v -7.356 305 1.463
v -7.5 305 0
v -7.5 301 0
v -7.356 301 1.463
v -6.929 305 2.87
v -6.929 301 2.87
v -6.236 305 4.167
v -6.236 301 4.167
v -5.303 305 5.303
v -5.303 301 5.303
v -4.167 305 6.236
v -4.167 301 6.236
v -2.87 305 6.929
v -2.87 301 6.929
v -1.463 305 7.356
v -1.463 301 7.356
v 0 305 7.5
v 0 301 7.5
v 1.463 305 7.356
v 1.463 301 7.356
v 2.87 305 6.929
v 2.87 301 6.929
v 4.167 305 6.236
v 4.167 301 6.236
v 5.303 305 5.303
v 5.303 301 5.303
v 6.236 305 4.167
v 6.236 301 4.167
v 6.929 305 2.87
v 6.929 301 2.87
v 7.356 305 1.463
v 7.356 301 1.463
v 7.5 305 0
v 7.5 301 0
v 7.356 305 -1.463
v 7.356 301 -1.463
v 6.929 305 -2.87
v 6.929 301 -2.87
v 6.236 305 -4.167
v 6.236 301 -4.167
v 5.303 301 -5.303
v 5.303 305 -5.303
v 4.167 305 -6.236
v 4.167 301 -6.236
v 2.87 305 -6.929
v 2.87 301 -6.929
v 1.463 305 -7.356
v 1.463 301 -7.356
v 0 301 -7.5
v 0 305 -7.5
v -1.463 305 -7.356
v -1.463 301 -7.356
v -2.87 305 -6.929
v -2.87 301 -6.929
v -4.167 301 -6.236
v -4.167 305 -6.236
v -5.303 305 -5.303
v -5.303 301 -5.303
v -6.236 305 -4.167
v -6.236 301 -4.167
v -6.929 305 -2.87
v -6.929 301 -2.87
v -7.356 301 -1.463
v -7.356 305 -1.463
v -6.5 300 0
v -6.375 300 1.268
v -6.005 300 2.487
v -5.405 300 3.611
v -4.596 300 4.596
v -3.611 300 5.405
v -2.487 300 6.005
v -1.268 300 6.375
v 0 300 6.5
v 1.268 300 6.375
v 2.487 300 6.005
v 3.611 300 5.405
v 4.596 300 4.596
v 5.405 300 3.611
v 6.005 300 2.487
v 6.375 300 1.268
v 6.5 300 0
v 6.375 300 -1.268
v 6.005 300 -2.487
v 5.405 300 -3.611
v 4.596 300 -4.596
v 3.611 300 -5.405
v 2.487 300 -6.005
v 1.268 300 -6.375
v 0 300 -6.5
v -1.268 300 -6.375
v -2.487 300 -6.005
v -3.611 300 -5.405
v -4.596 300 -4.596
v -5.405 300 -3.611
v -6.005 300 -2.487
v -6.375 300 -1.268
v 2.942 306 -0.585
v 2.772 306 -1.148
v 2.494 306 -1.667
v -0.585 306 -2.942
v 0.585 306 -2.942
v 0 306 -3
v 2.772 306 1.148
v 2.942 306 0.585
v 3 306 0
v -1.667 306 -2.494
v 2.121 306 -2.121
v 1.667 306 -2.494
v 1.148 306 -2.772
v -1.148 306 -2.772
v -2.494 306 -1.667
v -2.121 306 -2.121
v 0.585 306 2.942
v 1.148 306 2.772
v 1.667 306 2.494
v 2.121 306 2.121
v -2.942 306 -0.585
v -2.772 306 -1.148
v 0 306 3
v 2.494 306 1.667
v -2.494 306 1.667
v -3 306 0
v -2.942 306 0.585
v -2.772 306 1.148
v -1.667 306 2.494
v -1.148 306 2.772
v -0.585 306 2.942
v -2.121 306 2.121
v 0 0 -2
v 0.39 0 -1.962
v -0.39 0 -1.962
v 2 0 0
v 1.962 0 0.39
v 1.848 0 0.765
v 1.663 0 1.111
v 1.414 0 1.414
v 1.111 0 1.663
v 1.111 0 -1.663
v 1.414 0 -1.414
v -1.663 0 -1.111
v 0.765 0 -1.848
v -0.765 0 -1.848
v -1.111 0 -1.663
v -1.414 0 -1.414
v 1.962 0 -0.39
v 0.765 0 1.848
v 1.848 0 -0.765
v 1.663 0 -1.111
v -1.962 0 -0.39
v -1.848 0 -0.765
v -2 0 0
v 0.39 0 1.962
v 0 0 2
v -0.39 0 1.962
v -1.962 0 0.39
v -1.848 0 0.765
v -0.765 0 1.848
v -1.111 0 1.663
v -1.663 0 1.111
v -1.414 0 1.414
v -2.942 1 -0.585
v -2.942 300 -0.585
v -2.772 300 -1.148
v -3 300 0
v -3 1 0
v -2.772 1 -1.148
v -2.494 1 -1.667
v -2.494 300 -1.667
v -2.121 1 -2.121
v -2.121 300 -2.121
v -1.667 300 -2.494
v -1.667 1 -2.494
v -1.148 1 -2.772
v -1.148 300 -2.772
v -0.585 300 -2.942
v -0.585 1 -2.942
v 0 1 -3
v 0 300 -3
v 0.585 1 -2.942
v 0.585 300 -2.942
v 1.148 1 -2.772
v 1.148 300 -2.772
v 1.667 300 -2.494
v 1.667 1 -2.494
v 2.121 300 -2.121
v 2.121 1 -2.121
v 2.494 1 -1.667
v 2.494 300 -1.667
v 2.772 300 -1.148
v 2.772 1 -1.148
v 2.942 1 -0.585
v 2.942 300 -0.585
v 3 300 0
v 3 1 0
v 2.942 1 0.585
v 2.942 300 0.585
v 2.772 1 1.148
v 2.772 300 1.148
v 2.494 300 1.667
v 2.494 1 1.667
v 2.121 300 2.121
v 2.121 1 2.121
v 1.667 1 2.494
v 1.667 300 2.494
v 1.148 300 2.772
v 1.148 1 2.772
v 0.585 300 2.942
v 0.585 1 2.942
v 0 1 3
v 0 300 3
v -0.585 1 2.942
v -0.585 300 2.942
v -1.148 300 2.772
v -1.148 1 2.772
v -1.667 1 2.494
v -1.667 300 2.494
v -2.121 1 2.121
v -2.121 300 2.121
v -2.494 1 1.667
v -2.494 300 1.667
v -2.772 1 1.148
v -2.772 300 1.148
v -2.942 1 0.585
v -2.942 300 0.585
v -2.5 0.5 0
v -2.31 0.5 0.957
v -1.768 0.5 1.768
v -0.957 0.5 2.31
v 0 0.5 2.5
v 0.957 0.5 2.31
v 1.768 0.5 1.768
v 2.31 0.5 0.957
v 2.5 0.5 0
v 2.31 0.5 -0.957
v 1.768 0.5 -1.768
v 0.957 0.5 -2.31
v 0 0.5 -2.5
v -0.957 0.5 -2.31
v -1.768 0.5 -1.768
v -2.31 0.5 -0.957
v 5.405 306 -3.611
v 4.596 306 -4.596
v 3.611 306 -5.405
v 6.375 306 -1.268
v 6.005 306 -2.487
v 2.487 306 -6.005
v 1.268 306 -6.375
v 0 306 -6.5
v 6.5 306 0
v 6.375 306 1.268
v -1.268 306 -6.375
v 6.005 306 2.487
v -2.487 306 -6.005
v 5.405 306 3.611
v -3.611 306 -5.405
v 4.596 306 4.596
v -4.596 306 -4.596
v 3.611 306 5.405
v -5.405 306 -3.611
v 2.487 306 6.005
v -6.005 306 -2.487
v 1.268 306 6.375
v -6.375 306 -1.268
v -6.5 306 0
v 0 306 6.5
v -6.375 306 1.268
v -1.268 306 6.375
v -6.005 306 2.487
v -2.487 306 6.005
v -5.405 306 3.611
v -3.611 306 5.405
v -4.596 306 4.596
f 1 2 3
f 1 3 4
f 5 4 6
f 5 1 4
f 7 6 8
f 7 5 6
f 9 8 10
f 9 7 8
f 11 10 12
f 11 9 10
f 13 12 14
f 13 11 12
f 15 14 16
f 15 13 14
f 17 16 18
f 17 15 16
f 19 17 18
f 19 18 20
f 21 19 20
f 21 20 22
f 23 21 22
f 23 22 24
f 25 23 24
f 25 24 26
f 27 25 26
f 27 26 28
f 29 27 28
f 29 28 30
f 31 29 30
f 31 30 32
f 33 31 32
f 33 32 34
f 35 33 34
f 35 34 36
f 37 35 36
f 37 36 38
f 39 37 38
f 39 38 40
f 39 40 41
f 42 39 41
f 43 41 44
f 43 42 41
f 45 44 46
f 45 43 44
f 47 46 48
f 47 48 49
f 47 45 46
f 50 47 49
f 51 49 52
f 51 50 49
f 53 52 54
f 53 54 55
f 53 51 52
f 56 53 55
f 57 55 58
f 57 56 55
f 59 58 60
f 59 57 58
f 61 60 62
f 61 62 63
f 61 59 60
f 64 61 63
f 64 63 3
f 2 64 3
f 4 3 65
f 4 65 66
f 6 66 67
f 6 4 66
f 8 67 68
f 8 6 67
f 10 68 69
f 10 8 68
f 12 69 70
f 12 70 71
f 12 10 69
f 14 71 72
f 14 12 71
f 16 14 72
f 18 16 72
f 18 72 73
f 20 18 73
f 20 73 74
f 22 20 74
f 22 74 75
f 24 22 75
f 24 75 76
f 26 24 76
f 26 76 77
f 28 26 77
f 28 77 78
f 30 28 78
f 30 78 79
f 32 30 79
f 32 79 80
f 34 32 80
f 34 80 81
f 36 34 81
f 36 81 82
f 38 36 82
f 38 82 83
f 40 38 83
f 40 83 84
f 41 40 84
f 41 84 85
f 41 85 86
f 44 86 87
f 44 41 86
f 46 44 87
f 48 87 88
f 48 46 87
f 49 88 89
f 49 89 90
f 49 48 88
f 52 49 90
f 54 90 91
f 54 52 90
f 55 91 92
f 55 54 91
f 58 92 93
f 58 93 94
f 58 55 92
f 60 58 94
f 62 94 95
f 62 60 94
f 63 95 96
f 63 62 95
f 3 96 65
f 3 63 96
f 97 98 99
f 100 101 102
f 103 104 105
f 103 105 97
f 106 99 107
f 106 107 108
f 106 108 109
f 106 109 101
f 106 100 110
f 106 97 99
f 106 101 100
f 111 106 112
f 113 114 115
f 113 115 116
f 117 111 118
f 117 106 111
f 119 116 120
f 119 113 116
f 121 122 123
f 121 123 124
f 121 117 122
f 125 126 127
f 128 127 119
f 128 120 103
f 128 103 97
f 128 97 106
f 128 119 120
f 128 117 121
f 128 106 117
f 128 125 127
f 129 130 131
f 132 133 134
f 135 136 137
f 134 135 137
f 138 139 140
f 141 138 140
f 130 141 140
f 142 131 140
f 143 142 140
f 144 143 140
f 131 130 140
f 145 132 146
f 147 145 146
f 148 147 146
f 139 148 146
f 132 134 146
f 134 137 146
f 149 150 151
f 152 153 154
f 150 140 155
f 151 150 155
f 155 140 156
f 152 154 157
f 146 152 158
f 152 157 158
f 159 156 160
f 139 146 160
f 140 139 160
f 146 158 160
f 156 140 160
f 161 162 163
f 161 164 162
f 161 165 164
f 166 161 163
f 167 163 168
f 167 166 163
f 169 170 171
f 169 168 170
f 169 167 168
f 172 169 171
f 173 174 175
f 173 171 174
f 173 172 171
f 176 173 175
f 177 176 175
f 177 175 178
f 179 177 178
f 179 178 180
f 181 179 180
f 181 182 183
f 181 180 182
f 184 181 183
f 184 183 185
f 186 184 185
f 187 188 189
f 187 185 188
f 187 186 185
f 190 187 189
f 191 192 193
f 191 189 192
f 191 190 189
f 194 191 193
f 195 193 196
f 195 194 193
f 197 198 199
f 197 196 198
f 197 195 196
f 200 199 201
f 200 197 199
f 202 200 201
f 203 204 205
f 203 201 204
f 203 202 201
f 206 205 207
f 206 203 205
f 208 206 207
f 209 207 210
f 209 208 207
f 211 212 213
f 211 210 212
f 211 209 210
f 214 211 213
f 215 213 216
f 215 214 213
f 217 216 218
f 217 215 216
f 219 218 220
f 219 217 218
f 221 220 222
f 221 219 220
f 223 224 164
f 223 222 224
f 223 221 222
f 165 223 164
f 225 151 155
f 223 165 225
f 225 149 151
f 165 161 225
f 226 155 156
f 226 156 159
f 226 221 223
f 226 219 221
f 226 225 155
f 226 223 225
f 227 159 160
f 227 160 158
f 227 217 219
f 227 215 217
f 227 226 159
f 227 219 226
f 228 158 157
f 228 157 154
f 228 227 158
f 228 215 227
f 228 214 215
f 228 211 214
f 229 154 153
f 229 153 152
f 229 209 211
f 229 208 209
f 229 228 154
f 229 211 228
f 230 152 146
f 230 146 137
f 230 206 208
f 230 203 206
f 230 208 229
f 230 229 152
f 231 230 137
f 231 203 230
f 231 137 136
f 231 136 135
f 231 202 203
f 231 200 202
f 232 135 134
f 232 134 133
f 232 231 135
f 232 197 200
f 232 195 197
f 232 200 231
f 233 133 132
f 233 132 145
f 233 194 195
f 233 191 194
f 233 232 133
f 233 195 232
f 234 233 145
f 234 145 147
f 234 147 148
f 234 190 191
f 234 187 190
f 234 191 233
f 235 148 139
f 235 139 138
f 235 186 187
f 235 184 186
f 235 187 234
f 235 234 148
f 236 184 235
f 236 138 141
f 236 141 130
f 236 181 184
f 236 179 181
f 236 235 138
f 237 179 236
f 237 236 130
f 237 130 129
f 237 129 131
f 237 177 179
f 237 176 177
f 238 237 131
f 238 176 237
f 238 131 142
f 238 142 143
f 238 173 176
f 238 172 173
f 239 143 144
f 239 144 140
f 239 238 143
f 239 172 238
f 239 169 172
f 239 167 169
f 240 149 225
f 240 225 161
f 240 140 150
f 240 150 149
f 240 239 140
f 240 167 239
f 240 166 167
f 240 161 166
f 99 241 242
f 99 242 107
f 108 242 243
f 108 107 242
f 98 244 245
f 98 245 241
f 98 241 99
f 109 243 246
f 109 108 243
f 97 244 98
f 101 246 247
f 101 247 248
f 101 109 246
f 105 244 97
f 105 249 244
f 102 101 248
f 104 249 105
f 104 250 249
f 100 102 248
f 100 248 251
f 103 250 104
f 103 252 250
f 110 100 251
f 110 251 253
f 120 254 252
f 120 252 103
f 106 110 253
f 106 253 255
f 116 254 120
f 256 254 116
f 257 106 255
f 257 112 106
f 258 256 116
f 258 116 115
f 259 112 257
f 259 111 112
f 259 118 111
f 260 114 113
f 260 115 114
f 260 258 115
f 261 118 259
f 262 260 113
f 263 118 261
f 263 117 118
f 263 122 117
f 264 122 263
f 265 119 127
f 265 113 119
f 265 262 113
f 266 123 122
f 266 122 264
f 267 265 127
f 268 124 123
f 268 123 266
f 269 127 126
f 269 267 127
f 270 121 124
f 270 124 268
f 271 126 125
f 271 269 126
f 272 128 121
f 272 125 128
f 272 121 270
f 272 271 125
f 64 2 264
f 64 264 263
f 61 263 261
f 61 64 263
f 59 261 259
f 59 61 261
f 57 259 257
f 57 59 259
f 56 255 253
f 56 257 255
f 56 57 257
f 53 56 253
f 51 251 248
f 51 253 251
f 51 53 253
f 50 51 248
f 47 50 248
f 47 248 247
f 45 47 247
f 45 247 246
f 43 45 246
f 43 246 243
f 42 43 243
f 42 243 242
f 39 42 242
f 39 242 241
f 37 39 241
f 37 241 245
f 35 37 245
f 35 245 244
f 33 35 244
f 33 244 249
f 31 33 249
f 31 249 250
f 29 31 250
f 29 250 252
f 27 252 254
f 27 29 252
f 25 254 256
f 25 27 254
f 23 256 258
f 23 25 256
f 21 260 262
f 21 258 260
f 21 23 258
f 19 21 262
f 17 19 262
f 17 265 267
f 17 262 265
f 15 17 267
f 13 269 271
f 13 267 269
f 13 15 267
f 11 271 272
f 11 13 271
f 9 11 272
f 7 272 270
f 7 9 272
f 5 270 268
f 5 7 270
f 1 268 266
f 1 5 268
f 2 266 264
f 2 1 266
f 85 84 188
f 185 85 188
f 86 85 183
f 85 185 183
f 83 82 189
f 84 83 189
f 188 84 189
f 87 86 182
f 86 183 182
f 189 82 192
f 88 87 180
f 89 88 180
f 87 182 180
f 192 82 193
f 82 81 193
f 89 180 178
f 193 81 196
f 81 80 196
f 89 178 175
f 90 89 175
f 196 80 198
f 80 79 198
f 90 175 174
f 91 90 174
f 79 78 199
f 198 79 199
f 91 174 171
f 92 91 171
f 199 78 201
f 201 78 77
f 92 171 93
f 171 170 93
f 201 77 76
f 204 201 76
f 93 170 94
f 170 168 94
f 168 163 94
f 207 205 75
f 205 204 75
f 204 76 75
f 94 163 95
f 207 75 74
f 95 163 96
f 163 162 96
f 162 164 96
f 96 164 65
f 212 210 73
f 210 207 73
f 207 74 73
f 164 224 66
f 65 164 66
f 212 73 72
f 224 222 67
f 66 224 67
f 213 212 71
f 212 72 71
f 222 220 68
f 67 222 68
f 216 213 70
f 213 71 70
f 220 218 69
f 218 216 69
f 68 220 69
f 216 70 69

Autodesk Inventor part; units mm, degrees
ref_plane "YZ Plane" through (0, 0, 0) normal (1, 0, 0) x (0, 1, 0)
ref_plane "XZ Plane" through (0, 0, 0) normal (0, 1, 0) x (-1, 0, 0)
ref_plane "XY Plane" through (0, 0, 0) normal (0, 0, 1) x (1, 0, 0)
sketch "Эскиз1" plane through (0, 0, 0) normal (0, 0, 1) x (1, 0, 0)
  line L0 (-3, 300) -> (-3, 0)
  line L1 (-3, 0) -> (3, 0)
  line L2 (-3, 306) -> (-7.5, 306)
  line L3 (-7.5, 300) -> (-7.5, 306)
  line L4 (-7.5, 300) -> (-3, 300)
  line L5 (0, 0) -> (0, 306)
  line L6 (0, 306) -> (-3, 306)
  point P0 (0, 300)
  dimension "d1" = 3
  dimension "d4" = 7.5
  dimension "d6" = 6
  dimension "d8" = 300
revolve "Вращение1" add sketch "Эскиз1" angle 360 about axis through (0, 0, 0) along (0, 1, 0)
chamfer "Фаска1" distance 1 angle 45 1 edges at (3, 0, 0)
chamfer "Фаска2" distance 1 angle 45 2 edges at (7.5, 306, 0) (7.5, 300, 0)
thread "Резьба1" size "M6x1" class "6g" standard "ISO Metric profile" length 18
equation "\"d1\" = 0.5 * d0"
equation "\"d4\" = 0.5 * d3"
equation "\"d0\" = 6"
equation "\"d3\" = 15"
properties part number "Шуп масло"
